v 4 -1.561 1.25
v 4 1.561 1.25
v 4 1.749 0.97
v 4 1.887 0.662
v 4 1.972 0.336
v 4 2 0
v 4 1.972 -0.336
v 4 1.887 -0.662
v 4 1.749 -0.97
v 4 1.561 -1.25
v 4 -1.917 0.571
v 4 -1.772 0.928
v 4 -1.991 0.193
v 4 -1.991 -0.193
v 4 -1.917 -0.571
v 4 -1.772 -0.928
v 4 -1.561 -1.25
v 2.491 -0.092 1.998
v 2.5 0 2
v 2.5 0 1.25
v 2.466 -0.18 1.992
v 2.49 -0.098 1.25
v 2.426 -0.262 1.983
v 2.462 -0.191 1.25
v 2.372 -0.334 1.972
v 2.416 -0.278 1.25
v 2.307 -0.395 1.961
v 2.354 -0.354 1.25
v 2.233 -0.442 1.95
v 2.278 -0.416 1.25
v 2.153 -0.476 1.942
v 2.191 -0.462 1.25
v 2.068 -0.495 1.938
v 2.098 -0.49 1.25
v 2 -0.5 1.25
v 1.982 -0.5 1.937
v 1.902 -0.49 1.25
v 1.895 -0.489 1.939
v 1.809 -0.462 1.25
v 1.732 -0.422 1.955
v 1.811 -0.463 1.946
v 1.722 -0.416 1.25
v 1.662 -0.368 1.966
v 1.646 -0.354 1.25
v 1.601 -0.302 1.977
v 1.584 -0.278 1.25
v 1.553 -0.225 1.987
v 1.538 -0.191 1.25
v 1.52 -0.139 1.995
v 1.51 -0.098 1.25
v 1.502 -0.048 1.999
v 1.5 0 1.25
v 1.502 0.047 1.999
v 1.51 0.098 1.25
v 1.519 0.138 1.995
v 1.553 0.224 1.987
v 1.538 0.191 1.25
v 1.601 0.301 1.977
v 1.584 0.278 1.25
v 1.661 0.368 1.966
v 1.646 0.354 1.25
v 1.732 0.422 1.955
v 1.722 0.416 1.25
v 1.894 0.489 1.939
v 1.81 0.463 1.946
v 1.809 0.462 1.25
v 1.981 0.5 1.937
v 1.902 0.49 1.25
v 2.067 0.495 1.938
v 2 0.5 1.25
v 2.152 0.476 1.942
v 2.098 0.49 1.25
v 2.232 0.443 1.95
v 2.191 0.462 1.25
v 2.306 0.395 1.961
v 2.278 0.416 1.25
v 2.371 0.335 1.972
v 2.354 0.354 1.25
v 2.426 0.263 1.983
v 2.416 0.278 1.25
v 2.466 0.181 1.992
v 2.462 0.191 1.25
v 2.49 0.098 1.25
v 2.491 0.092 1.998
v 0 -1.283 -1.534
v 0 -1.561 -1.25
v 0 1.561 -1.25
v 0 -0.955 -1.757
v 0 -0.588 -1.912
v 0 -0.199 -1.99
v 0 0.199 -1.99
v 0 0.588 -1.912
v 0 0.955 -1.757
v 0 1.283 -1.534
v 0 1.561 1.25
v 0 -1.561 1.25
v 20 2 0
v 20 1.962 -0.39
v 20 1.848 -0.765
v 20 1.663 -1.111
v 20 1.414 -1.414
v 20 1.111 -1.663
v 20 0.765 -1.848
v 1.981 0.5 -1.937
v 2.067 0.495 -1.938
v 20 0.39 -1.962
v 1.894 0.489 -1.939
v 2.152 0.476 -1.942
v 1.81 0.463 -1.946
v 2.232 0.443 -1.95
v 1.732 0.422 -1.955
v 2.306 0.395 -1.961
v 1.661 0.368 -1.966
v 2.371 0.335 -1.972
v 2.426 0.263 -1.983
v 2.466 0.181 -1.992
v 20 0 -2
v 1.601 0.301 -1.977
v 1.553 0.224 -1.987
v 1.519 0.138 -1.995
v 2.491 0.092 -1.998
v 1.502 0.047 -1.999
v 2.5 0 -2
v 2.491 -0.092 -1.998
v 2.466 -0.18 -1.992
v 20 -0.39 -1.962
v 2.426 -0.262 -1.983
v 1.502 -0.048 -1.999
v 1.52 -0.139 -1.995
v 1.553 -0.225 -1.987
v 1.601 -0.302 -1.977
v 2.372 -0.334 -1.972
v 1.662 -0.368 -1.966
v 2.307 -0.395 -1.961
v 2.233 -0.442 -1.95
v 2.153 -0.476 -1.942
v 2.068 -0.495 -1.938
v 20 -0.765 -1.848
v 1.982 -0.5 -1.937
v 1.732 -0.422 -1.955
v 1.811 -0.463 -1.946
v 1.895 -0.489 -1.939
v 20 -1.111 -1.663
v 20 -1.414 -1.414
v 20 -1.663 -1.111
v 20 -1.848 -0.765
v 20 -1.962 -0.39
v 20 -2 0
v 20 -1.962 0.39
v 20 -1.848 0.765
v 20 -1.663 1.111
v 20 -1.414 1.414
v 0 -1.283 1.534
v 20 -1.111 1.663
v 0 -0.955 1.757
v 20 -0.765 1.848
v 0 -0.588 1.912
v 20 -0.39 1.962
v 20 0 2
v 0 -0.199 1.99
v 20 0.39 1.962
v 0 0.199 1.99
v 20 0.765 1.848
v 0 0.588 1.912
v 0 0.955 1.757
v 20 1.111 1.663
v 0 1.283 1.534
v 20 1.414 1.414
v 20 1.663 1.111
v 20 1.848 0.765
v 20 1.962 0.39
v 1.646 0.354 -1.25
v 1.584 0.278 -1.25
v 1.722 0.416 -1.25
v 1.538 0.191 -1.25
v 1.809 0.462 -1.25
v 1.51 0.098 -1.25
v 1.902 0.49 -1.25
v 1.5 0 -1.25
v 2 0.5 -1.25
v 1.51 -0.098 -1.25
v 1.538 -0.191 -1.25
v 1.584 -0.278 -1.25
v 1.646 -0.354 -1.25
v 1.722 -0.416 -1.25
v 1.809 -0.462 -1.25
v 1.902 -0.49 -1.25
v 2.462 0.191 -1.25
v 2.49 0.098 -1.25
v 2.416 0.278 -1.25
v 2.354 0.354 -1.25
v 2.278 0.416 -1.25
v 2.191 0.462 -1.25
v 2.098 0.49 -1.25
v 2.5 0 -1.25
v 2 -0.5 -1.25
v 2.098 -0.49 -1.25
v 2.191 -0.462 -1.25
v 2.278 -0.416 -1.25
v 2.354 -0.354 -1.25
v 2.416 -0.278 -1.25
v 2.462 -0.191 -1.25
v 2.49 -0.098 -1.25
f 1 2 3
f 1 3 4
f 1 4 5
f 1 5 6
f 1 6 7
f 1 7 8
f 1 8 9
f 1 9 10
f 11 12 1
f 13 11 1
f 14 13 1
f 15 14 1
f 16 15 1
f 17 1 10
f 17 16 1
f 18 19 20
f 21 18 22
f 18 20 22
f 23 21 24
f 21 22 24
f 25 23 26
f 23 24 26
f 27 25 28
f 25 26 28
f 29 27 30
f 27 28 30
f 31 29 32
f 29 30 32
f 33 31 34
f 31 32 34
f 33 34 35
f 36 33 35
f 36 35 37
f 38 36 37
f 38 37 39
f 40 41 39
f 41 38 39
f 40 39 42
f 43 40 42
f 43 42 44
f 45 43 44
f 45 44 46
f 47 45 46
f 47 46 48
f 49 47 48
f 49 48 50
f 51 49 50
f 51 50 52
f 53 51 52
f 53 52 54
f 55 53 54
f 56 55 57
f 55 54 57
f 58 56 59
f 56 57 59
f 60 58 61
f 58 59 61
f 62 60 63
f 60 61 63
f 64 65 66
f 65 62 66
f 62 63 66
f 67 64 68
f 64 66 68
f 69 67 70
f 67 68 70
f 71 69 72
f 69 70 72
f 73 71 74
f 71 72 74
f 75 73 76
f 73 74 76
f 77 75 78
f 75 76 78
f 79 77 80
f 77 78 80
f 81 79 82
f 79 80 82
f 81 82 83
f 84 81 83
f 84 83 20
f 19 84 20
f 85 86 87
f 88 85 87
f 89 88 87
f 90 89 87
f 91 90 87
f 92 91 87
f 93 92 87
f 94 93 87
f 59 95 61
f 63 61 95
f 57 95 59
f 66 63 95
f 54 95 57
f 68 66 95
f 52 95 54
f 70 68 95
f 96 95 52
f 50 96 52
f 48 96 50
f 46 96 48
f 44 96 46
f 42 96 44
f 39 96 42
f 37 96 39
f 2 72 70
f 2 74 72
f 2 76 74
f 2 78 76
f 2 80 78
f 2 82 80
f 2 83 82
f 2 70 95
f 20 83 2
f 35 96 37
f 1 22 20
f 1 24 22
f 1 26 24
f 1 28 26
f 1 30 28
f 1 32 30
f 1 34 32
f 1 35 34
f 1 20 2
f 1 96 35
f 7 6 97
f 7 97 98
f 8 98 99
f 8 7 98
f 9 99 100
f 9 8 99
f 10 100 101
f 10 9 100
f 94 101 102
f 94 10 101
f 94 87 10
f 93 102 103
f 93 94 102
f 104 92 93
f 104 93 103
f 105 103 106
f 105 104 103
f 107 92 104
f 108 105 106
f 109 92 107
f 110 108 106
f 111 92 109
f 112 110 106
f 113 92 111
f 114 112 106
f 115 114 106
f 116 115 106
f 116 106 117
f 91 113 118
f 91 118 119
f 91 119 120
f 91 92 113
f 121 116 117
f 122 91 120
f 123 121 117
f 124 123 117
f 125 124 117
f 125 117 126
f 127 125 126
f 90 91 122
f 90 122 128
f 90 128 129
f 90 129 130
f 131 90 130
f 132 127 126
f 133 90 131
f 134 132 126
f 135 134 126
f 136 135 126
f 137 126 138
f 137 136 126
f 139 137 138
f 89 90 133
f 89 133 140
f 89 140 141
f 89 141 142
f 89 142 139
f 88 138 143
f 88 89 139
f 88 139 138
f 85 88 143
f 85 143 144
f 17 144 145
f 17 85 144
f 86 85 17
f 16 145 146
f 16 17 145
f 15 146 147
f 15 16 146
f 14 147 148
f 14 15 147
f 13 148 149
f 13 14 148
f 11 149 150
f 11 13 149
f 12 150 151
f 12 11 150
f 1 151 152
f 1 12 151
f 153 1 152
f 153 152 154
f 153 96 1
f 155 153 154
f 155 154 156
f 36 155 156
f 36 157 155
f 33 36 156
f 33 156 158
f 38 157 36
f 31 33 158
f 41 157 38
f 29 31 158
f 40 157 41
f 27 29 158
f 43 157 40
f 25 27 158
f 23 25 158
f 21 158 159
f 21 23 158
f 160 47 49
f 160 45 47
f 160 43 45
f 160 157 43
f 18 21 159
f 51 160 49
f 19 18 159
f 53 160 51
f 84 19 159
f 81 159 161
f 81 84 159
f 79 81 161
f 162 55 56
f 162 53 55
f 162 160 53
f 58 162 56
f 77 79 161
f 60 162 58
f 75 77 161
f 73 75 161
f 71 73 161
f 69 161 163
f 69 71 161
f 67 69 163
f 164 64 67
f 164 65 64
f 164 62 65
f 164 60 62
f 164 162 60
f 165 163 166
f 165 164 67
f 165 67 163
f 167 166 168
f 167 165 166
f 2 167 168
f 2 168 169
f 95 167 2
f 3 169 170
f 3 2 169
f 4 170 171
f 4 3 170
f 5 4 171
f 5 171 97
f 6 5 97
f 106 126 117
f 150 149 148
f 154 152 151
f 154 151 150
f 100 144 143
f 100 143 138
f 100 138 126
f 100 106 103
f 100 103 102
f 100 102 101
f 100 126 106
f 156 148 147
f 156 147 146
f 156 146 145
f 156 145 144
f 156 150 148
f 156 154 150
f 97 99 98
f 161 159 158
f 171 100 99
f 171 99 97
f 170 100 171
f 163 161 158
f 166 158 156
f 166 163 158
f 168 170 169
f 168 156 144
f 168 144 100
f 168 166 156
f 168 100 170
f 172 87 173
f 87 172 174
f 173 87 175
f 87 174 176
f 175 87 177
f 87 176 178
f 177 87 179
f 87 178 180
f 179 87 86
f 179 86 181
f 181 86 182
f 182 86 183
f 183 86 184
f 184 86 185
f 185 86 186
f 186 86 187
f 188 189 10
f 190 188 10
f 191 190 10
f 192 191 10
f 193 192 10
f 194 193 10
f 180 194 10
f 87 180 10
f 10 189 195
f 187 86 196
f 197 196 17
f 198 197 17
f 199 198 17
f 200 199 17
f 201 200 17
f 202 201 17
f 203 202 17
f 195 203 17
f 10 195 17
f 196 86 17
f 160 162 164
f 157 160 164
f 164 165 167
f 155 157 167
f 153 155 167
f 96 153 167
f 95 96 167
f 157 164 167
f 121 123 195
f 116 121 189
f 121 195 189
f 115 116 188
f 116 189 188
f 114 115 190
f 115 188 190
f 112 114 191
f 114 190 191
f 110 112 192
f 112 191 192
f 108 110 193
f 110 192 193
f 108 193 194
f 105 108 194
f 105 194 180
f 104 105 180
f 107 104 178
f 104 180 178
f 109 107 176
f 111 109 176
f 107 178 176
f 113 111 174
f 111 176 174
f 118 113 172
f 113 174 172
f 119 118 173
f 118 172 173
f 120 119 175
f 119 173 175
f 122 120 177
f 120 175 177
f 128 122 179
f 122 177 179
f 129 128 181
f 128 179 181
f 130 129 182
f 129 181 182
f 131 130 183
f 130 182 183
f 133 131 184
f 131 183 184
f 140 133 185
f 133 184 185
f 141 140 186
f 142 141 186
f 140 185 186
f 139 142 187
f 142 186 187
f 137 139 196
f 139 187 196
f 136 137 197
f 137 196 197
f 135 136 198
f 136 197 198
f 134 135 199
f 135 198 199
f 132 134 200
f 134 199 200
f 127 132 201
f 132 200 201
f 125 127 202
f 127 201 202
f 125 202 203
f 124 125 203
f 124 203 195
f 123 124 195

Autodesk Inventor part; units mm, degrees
ref_plane "YZ Plane" through (0, 0, 0) normal (1, 0, 0) x (0, 1, 0)
ref_plane "XZ Plane" through (0, 0, 0) normal (0, 1, 0) x (-1, 0, 0)
ref_plane "XY Plane" through (0, 0, 0) normal (0, 0, 1) x (1, 0, 0)
sketch "草图1" plane through (0, 0, 0) normal (1, 0, 0) x (0, 1, 0)
  circle A0 centre (0, 0) radius 2
  dimension "孔径" = 4
extrude "拉伸1" add sketch "草图1" along normal blind 20
sketch "草图2" plane through (0, 0, 0) normal (0, 1, 0) x (-1, 0, 0)
  line L0 (-20, 2) -> (-20, -2) projected
  line L1 (0, -2) -> (0, 2) projected
  line L2 (0, 2) -> (-20, 2) projected
  line L3 (-4, 2) -> (-4, -2)
  line L4 (0, 0) -> (-4, 0) construction
  line L5 (0, 1.25) -> (-4, 1.25)
  line L6 (0, -1.25) -> (-4, -1.25)
  dimension "d4" = 4
  dimension "距离" = 2.5
extrude "拉伸2" cut sketch "草图2" along normal through all both and the other way through all contours L6 L3 L5 L1
sketch "草图3" plane through (0, 0, 0) normal (0, 0, 1) x (1, 0, 0)
  line L0 (4, -1.5612) -> (0, -1.5612) projected
  line L1 (4, -1.5612) -> (4, 1.5612) projected
  line L2 (0, 1.5612) -> (4, 1.5612) projected
  line L3 (0, -1.5612) -> (0, 1.5612) projected
  circle A0 centre (2, 0) radius 0.5
  point P0 (0, 0)
  dimension "销孔径" = 1
extrude "拉伸3" cut sketch "草图3" along normal through all both and the other way through all contours A0
properties part number "曲柄杆" material "木材(桦木)"
